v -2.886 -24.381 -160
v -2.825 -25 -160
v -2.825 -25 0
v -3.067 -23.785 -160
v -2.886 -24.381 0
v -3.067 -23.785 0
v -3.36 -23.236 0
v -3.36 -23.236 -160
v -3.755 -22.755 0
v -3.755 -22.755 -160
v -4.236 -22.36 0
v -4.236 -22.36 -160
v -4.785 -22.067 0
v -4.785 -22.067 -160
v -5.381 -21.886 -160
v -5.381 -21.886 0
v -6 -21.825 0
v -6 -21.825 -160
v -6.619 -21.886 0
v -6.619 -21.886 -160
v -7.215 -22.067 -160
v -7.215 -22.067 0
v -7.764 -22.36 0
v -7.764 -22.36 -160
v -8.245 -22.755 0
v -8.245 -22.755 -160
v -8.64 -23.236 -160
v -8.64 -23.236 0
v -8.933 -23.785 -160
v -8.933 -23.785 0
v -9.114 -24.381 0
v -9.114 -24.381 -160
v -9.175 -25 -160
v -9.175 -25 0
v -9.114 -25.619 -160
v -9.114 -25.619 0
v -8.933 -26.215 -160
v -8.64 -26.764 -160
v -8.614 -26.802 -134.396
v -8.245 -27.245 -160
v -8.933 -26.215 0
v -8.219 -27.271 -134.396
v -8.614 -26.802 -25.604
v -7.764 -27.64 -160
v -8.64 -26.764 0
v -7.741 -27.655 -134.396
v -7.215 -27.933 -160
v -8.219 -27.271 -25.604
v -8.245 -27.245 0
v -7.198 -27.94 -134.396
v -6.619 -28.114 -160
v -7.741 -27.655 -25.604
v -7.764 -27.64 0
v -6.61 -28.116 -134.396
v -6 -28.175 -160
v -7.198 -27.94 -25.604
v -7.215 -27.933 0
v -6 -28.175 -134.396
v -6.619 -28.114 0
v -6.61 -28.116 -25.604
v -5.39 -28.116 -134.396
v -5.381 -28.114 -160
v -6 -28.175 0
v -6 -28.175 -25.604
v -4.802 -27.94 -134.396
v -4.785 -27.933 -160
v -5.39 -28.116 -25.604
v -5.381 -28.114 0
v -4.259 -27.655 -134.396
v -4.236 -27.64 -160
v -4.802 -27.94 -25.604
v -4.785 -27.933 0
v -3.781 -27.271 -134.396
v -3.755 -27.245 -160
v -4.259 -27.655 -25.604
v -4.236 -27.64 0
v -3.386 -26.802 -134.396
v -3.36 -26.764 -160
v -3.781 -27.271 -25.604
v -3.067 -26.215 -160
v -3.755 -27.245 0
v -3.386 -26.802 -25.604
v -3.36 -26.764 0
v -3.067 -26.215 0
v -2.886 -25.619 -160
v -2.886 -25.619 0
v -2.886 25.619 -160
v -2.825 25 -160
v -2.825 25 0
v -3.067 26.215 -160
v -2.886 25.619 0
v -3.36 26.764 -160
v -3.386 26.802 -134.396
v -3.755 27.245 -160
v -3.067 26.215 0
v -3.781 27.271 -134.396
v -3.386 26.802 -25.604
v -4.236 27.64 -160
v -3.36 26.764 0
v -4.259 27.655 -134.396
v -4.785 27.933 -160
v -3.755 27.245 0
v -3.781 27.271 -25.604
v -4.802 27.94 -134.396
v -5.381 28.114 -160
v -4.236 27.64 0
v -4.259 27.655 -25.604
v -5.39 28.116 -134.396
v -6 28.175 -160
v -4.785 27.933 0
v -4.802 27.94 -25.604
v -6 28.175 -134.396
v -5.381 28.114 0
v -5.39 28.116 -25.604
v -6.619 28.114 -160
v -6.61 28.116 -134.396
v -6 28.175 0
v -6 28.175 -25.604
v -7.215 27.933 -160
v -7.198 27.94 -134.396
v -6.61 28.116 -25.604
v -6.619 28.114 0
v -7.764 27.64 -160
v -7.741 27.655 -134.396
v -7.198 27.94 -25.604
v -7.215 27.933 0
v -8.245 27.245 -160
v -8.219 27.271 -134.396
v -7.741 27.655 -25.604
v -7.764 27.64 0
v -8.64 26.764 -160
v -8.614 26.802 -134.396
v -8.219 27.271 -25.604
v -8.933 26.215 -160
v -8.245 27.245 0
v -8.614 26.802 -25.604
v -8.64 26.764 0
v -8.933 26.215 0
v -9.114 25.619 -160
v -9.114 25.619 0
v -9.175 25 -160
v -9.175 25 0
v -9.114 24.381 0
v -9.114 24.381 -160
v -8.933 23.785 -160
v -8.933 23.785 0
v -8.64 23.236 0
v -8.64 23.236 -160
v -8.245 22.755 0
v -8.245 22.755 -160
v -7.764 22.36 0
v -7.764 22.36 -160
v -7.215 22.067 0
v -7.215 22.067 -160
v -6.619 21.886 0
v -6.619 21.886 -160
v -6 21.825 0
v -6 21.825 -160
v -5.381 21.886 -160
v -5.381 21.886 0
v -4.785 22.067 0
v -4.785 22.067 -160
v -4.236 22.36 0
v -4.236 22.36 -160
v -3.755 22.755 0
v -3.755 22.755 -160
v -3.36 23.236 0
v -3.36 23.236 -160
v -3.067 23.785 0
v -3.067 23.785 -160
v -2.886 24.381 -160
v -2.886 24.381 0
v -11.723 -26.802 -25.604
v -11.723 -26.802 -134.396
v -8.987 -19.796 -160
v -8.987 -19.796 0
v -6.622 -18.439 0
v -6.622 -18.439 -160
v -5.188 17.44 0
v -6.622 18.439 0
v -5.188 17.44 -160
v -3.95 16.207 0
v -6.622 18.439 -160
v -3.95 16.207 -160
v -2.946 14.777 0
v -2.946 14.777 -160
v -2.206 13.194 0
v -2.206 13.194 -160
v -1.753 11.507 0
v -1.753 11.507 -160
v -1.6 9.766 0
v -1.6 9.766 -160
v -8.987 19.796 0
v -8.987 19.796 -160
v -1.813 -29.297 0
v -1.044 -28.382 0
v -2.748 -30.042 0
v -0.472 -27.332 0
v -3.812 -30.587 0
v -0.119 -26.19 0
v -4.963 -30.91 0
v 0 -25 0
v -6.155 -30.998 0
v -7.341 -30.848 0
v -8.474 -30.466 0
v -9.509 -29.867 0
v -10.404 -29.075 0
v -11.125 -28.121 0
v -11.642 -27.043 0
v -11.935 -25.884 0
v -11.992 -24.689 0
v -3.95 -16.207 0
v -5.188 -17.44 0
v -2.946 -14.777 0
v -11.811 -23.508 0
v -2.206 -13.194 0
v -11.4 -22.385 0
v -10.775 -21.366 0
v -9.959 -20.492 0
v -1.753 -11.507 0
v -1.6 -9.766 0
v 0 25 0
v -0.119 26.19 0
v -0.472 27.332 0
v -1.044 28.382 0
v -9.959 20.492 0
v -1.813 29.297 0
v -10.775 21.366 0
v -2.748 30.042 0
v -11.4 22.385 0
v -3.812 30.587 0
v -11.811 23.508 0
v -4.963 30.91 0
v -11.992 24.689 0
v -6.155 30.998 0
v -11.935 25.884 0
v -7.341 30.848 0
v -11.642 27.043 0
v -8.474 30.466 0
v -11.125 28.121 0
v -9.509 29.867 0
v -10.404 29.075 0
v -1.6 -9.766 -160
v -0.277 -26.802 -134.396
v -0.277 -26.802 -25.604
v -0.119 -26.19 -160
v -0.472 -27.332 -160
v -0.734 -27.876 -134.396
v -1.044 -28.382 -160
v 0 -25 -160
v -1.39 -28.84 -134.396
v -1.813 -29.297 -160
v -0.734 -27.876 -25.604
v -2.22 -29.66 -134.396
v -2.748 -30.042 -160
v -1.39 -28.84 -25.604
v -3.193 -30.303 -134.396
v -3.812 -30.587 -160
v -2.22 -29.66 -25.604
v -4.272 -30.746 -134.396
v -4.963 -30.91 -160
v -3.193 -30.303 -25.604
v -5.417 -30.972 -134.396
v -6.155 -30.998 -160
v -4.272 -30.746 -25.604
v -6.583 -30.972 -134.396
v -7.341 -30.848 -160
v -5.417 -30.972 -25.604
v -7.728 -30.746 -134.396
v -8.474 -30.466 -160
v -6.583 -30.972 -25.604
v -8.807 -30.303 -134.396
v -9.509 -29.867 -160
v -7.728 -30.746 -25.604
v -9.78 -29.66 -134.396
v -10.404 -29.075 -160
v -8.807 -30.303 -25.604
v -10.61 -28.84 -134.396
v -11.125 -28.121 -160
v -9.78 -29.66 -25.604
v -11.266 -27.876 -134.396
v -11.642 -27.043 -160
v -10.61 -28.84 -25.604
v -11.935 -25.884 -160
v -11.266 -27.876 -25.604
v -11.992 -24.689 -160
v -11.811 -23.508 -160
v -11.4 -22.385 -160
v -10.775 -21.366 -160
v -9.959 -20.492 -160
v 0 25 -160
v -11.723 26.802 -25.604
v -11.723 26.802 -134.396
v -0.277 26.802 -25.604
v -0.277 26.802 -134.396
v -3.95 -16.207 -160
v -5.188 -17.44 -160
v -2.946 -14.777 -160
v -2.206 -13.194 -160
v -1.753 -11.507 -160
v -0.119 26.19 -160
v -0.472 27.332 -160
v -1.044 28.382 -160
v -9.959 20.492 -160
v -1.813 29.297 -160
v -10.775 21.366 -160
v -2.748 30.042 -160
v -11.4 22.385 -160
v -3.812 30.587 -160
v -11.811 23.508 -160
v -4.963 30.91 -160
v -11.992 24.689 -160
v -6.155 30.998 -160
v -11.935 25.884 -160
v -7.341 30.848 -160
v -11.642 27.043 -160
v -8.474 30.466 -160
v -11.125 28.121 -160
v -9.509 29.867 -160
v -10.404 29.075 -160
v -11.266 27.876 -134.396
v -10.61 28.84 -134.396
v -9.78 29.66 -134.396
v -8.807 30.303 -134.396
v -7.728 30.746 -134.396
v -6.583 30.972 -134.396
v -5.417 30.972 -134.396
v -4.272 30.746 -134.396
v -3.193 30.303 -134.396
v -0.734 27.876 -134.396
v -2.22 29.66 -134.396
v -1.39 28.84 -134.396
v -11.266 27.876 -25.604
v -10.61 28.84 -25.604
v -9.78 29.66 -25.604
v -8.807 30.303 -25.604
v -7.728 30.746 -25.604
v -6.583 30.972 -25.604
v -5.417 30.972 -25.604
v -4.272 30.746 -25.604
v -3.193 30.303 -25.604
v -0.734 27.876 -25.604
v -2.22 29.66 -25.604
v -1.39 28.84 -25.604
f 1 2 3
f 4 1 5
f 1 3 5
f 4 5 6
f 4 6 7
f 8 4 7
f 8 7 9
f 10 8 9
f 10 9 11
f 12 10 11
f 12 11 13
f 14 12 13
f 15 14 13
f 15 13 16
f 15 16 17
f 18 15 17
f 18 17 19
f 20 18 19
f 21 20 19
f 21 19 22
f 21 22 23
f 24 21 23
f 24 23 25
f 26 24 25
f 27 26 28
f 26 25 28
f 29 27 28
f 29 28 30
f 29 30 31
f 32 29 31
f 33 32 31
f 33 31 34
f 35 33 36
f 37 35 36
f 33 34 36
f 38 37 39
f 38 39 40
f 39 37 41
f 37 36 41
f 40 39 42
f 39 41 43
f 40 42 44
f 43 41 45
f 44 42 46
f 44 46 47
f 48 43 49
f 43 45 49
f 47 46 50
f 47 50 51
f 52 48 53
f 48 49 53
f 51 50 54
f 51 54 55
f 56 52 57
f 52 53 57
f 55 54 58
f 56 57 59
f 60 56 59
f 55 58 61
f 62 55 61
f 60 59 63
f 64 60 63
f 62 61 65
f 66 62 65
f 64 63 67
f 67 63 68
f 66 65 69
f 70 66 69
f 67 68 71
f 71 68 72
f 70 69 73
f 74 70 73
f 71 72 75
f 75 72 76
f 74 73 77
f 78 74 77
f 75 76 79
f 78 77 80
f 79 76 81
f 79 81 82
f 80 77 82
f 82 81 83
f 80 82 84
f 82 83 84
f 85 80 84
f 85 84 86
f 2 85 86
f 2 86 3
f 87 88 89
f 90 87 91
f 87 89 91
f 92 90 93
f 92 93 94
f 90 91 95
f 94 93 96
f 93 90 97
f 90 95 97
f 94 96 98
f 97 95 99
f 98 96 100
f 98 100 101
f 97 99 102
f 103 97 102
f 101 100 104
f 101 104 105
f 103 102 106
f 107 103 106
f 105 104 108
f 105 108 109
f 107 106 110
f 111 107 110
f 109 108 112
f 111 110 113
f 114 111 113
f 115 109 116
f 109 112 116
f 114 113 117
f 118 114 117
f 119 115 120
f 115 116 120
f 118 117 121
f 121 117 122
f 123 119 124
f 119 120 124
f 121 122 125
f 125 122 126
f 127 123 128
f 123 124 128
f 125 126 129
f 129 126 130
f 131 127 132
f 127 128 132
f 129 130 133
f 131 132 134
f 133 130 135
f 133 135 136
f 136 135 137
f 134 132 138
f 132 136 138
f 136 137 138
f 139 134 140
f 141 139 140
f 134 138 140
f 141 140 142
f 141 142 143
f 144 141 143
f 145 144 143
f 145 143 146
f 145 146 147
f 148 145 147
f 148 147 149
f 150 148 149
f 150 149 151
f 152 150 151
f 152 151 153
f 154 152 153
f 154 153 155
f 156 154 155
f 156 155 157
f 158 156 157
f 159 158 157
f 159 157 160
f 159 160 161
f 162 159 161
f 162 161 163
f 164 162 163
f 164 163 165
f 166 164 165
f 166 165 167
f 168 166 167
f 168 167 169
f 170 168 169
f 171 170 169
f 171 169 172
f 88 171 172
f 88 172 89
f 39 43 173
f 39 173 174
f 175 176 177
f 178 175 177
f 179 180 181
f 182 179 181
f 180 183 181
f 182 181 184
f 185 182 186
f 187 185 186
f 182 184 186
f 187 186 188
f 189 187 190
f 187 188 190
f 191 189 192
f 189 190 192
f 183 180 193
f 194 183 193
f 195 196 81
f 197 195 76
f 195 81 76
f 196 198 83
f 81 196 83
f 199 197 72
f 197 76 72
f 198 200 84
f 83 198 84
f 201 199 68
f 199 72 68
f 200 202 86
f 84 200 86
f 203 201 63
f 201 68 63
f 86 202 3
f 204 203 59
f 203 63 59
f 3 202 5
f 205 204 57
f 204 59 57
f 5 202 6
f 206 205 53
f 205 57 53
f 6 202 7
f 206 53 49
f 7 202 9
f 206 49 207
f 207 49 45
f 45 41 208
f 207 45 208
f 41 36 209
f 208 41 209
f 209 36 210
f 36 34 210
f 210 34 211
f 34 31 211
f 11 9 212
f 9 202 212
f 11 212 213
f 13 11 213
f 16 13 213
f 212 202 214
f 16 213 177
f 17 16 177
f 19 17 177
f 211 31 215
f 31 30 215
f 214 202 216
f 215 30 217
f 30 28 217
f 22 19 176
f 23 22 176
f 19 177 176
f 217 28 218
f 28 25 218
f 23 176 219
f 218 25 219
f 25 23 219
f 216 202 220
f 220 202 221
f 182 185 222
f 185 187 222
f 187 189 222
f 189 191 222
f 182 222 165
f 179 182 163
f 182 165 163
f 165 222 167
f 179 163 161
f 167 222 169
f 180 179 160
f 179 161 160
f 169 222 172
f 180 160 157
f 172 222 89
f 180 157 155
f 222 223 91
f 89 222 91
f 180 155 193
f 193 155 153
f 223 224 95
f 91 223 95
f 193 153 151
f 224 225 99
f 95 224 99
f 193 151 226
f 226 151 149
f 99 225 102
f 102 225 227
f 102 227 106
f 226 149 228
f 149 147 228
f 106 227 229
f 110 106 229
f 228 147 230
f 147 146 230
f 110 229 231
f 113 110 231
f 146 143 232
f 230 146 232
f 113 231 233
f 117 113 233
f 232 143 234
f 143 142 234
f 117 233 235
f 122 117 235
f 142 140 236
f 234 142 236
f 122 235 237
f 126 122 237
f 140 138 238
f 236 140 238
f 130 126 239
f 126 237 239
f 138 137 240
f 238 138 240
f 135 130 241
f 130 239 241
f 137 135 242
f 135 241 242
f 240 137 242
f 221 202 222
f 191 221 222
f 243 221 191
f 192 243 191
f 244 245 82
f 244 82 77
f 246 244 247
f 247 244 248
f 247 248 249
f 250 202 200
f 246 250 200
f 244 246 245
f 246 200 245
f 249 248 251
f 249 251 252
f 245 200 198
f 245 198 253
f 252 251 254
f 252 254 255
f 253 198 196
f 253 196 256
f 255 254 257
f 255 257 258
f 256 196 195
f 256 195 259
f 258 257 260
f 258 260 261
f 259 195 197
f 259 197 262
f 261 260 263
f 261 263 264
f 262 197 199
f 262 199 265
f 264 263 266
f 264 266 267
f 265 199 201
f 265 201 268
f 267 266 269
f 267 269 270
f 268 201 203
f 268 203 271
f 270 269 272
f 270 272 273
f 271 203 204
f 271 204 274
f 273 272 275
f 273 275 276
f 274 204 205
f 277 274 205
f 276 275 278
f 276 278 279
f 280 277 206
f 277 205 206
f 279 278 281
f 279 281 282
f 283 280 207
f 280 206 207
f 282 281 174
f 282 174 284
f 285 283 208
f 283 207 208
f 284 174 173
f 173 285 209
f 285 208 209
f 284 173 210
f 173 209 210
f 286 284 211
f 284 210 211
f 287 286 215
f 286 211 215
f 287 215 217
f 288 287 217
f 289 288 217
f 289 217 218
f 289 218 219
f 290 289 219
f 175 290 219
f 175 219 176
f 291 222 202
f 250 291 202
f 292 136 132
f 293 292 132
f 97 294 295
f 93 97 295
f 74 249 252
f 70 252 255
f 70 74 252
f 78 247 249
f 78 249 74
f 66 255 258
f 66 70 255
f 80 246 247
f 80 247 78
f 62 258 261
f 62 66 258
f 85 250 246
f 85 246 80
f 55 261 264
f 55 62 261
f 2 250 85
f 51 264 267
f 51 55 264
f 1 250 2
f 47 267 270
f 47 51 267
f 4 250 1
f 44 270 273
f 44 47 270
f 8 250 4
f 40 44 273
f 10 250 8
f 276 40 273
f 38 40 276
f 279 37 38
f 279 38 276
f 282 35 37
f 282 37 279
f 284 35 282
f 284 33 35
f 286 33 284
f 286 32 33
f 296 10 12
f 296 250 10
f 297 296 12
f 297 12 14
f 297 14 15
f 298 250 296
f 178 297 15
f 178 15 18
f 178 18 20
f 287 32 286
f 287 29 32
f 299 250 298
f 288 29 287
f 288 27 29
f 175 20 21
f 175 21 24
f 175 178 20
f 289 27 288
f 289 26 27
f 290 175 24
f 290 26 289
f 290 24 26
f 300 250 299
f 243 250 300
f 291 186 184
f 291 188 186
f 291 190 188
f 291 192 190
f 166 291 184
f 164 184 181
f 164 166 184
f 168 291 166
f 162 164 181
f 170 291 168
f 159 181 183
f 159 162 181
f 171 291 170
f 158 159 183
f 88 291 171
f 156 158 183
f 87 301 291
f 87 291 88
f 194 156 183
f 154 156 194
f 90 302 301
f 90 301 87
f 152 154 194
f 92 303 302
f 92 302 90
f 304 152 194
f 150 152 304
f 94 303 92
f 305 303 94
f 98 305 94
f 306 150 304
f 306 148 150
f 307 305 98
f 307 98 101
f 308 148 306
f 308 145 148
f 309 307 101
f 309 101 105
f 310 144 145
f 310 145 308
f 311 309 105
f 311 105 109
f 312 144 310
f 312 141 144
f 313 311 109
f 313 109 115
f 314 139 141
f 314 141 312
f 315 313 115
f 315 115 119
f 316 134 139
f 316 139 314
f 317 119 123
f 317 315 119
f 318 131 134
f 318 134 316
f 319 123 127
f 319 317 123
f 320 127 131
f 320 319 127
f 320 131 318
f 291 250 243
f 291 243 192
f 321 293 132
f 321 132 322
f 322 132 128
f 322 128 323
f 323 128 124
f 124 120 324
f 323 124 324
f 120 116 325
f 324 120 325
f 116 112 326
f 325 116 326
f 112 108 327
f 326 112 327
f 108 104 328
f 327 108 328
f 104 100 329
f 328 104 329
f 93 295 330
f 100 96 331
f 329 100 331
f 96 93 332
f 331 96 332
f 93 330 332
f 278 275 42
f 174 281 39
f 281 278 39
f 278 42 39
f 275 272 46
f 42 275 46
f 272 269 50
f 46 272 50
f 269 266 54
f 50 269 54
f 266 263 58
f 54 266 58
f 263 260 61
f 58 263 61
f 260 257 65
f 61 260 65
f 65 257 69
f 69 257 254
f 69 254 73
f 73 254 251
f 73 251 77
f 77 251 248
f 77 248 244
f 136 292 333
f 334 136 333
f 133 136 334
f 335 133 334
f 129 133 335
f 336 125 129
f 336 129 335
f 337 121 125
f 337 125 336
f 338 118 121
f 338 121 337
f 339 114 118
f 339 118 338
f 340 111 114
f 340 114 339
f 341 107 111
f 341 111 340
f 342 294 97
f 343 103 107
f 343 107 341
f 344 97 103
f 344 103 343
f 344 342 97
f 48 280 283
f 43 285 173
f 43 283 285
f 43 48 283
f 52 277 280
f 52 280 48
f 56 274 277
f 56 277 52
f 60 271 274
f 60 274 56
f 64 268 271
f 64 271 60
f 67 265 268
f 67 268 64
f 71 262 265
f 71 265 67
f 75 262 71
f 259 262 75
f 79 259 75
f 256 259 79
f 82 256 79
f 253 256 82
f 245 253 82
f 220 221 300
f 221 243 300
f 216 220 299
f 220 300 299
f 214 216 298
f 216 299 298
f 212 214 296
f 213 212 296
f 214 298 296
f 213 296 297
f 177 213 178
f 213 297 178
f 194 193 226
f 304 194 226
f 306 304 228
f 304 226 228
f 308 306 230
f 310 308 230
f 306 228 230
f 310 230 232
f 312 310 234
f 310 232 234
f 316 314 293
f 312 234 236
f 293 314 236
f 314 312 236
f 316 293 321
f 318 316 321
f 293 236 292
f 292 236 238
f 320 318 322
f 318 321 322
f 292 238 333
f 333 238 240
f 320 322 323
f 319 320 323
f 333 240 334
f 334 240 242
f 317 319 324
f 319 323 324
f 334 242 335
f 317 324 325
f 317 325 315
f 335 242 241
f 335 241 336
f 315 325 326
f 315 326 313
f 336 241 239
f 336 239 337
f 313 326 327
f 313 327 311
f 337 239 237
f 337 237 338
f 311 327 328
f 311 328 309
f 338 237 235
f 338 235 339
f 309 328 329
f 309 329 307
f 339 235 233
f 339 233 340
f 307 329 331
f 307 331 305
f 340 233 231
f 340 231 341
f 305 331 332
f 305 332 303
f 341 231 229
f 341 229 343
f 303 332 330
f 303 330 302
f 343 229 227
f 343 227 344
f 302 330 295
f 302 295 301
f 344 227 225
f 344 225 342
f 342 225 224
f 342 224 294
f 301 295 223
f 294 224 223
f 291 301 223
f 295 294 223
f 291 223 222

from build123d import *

# Parameters (mm, degrees)
CROQUIS1_R              = 3.175
SALIENTE_EXTRUIR1_DEPTH = 160
REDONDEO1_R             = 10
CROQUIS3_W              = 108.791812306
CROQUIS3_H              = 18.145434914
CORTAR_EXTRUIR2_DEPTH   = 13


with BuildPart() as part:
    # Croquis1 → Saliente-Extruir1 (new body)
    with BuildSketch(Plane.XY):
        with BuildLine():
            Line((-1.6, 15.556228096), (-8.98691391, 19.796314259))
            ThreePointArc((-8.98691391, 19.796314259), (-9.006535925, 30.19237342), (0, 25))
            Line((0, 25), (0, -25))
            ThreePointArc((0, -25), (-9.006535925, -30.19237342), (-8.98691391, -19.796314259))
            Line((-8.98691391, -19.796314259), (-1.6, -15.556228096))
            Line((-1.6, -15.556228096), (-1.6, 15.556228096))
        make_face()
        with Locations((-6, 25)):
            Circle(CROQUIS1_R, mode=Mode.SUBTRACT)
        with Locations((-6, -25)):
            Circle(CROQUIS1_R, mode=Mode.SUBTRACT)
    extrude(amount=-SALIENTE_EXTRUIR1_DEPTH)

    # Redondeo1
    redondeo1_edges = [part.edges().sort_by_distance(p)[0] for p in [
        (-1.6, -15.556228096, -80),
        (-1.6, 15.556228096, -80),
    ]]
    fillet(redondeo1_edges, radius=REDONDEO1_R)

    # Croquis3 → Cortar-Extruir2 (cut, through all)
    with BuildSketch(Plane(origin=(0, 0, 0), x_dir=(0, 0, -1), z_dir=(1, 0, 0))):
        with Locations((80, 35.875128035)):
            Rectangle(CROQUIS3_W, CROQUIS3_H)
        with Locations((80, -35.875128035)):
            Rectangle(CROQUIS3_W, CROQUIS3_H)
    extrude(amount=-CORTAR_EXTRUIR2_DEPTH, mode=Mode.SUBTRACT)


solid = part.part
